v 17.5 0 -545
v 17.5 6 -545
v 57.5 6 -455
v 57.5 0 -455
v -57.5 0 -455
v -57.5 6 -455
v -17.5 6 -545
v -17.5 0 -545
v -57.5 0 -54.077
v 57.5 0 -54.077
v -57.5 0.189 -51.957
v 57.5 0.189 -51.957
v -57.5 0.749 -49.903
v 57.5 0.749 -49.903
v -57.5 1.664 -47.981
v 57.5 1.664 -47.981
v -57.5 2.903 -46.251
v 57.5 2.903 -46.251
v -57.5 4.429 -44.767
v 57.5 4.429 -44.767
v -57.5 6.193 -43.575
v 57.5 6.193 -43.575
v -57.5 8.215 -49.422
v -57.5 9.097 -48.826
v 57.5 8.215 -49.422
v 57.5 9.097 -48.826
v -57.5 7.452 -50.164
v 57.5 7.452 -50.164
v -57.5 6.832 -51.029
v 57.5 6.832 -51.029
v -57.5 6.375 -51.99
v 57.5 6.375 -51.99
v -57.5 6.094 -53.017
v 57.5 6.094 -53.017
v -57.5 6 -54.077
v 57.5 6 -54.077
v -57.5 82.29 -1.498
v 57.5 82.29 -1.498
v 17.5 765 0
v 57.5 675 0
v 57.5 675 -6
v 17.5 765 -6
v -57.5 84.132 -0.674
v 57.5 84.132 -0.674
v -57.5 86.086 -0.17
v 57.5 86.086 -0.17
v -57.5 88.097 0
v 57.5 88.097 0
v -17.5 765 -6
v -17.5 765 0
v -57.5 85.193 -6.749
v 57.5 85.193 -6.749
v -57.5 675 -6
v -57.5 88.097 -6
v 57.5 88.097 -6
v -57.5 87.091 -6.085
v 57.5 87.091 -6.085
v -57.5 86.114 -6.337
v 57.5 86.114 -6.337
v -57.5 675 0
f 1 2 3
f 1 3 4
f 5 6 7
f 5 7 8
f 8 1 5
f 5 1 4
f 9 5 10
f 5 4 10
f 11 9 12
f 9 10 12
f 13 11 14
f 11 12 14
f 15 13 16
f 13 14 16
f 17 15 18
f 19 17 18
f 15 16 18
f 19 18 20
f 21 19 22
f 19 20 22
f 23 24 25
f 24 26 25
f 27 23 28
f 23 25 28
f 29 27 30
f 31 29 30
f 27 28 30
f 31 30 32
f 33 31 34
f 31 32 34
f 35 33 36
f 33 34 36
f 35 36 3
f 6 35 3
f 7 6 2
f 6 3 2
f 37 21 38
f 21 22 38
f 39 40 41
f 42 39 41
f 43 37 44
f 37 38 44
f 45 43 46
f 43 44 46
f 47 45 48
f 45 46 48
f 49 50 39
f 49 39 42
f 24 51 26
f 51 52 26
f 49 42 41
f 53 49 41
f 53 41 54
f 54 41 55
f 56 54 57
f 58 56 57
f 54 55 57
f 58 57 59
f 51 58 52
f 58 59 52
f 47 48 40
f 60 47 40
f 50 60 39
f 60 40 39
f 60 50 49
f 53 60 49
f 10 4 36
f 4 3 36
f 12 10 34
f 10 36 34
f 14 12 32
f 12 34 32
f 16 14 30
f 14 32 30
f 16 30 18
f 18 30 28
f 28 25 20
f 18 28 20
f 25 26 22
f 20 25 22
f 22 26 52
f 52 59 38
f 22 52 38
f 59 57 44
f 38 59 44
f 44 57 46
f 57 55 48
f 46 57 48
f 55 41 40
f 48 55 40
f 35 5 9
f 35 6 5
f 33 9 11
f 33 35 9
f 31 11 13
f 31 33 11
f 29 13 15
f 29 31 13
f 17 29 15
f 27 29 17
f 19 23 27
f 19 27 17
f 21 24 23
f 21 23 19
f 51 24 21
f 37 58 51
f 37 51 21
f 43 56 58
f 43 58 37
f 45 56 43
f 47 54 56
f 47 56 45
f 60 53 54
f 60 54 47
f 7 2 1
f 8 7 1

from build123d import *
from OCP.BRepFilletAPI import BRepFilletAPI_MakeChamfer

# Parameters (mm, degrees)
SM_BASE_FLANGE_1_DEPTH = 57.5
CHAMFER_1_SIZE         = 40
CHAMFER_1_SIZE2        = 90
CHAMFER_2_SIZE         = 90
CHAMFER_2_SIZE2        = 40


# Sheet-metal steps are written as plain solids
with BuildPart() as part:
    # Sketch 1 → 基体-法兰1 (new, symmetric)
    with BuildSketch(Plane(origin=(0, 0, 0), x_dir=(0, 0, -1), z_dir=(1, 0, 0))):
        with BuildLine():
            Line((545, 0), (54.077004305, 0))
            ThreePointArc((54.077004305, 0), (47.981132154, 1.663639774), (43.575482564, 6.193276214))
            Line((43.575482564, 6.193276214), (1.498478259, 82.289986127))
            ThreePointArc((1.498478259, 82.289986127), (0.380657056, 85.09823204), (0, 88.096709913))
            Line((0, 88.096709913), (0, 765))
            Line((0, 765), (6, 765))
            Line((6, 765), (6, 88.096709913))
            ThreePointArc((6, 88.096709913), (6.190328528, 86.597470976), (6.74923913, 85.19334802))
            Line((6.74923913, 85.19334802), (48.826243434, 9.096638107))
            ThreePointArc((48.826243434, 9.096638107), (51.029068229, 6.831819887), (54.077004305, 6))
            Line((54.077004305, 6), (545, 6))
            Line((545, 6), (545, 0))
        make_face()
    extrude(amount=SM_BASE_FLANGE_1_DEPTH, both=True)

    # 倒角1: one chamfer whose edges measure the first distance from different faces: ONE call of the kernel's chamfer builder (chamfer() names one face for all edges)
    chamfer_1_edges_1 = [part.edges().sort_by_distance(p)[0] for p in [
        (-57.5, 765, -3),
    ]]
    chamfer_1_side_1 = [part.faces().sort_by_distance(p)[0] for p in [
        (0, 765, -3),
    ]]
    chamfer_1_edges_2 = [part.edges().sort_by_distance(p)[0] for p in [
        (-57.5, 3, -545),
    ]]
    chamfer_1_side_2 = [part.faces().sort_by_distance(p)[0] for p in [
        (0, 3, -545),
    ]]
    chamfer_1 = BRepFilletAPI_MakeChamfer(part.part.solid().wrapped)
    for e in chamfer_1_edges_1:
        chamfer_1.Add(CHAMFER_1_SIZE, CHAMFER_1_SIZE2, e.wrapped, chamfer_1_side_1[0].wrapped)  # the first distance lies on this face
    for e in chamfer_1_edges_2:
        chamfer_1.Add(CHAMFER_1_SIZE, CHAMFER_1_SIZE2, e.wrapped, chamfer_1_side_2[0].wrapped)  # the first distance lies on this face
    add(Compound.cast(chamfer_1.Shape()), mode=Mode.REPLACE)

    # 倒角2
    chamfer_2_edges = [part.edges().sort_by_distance(p)[0] for p in [
        (57.5, 765, -3),
        (57.5, 3, -545),
    ]]
    chamfer_2_side = [part.faces().sort_by_distance(p)[0] for p in [
        (57.5, 6.022757105, -50.551923163),
    ]]
    chamfer(chamfer_2_edges, length=CHAMFER_2_SIZE, length2=CHAMFER_2_SIZE2, reference=chamfer_2_side[0])


solid = part.part
